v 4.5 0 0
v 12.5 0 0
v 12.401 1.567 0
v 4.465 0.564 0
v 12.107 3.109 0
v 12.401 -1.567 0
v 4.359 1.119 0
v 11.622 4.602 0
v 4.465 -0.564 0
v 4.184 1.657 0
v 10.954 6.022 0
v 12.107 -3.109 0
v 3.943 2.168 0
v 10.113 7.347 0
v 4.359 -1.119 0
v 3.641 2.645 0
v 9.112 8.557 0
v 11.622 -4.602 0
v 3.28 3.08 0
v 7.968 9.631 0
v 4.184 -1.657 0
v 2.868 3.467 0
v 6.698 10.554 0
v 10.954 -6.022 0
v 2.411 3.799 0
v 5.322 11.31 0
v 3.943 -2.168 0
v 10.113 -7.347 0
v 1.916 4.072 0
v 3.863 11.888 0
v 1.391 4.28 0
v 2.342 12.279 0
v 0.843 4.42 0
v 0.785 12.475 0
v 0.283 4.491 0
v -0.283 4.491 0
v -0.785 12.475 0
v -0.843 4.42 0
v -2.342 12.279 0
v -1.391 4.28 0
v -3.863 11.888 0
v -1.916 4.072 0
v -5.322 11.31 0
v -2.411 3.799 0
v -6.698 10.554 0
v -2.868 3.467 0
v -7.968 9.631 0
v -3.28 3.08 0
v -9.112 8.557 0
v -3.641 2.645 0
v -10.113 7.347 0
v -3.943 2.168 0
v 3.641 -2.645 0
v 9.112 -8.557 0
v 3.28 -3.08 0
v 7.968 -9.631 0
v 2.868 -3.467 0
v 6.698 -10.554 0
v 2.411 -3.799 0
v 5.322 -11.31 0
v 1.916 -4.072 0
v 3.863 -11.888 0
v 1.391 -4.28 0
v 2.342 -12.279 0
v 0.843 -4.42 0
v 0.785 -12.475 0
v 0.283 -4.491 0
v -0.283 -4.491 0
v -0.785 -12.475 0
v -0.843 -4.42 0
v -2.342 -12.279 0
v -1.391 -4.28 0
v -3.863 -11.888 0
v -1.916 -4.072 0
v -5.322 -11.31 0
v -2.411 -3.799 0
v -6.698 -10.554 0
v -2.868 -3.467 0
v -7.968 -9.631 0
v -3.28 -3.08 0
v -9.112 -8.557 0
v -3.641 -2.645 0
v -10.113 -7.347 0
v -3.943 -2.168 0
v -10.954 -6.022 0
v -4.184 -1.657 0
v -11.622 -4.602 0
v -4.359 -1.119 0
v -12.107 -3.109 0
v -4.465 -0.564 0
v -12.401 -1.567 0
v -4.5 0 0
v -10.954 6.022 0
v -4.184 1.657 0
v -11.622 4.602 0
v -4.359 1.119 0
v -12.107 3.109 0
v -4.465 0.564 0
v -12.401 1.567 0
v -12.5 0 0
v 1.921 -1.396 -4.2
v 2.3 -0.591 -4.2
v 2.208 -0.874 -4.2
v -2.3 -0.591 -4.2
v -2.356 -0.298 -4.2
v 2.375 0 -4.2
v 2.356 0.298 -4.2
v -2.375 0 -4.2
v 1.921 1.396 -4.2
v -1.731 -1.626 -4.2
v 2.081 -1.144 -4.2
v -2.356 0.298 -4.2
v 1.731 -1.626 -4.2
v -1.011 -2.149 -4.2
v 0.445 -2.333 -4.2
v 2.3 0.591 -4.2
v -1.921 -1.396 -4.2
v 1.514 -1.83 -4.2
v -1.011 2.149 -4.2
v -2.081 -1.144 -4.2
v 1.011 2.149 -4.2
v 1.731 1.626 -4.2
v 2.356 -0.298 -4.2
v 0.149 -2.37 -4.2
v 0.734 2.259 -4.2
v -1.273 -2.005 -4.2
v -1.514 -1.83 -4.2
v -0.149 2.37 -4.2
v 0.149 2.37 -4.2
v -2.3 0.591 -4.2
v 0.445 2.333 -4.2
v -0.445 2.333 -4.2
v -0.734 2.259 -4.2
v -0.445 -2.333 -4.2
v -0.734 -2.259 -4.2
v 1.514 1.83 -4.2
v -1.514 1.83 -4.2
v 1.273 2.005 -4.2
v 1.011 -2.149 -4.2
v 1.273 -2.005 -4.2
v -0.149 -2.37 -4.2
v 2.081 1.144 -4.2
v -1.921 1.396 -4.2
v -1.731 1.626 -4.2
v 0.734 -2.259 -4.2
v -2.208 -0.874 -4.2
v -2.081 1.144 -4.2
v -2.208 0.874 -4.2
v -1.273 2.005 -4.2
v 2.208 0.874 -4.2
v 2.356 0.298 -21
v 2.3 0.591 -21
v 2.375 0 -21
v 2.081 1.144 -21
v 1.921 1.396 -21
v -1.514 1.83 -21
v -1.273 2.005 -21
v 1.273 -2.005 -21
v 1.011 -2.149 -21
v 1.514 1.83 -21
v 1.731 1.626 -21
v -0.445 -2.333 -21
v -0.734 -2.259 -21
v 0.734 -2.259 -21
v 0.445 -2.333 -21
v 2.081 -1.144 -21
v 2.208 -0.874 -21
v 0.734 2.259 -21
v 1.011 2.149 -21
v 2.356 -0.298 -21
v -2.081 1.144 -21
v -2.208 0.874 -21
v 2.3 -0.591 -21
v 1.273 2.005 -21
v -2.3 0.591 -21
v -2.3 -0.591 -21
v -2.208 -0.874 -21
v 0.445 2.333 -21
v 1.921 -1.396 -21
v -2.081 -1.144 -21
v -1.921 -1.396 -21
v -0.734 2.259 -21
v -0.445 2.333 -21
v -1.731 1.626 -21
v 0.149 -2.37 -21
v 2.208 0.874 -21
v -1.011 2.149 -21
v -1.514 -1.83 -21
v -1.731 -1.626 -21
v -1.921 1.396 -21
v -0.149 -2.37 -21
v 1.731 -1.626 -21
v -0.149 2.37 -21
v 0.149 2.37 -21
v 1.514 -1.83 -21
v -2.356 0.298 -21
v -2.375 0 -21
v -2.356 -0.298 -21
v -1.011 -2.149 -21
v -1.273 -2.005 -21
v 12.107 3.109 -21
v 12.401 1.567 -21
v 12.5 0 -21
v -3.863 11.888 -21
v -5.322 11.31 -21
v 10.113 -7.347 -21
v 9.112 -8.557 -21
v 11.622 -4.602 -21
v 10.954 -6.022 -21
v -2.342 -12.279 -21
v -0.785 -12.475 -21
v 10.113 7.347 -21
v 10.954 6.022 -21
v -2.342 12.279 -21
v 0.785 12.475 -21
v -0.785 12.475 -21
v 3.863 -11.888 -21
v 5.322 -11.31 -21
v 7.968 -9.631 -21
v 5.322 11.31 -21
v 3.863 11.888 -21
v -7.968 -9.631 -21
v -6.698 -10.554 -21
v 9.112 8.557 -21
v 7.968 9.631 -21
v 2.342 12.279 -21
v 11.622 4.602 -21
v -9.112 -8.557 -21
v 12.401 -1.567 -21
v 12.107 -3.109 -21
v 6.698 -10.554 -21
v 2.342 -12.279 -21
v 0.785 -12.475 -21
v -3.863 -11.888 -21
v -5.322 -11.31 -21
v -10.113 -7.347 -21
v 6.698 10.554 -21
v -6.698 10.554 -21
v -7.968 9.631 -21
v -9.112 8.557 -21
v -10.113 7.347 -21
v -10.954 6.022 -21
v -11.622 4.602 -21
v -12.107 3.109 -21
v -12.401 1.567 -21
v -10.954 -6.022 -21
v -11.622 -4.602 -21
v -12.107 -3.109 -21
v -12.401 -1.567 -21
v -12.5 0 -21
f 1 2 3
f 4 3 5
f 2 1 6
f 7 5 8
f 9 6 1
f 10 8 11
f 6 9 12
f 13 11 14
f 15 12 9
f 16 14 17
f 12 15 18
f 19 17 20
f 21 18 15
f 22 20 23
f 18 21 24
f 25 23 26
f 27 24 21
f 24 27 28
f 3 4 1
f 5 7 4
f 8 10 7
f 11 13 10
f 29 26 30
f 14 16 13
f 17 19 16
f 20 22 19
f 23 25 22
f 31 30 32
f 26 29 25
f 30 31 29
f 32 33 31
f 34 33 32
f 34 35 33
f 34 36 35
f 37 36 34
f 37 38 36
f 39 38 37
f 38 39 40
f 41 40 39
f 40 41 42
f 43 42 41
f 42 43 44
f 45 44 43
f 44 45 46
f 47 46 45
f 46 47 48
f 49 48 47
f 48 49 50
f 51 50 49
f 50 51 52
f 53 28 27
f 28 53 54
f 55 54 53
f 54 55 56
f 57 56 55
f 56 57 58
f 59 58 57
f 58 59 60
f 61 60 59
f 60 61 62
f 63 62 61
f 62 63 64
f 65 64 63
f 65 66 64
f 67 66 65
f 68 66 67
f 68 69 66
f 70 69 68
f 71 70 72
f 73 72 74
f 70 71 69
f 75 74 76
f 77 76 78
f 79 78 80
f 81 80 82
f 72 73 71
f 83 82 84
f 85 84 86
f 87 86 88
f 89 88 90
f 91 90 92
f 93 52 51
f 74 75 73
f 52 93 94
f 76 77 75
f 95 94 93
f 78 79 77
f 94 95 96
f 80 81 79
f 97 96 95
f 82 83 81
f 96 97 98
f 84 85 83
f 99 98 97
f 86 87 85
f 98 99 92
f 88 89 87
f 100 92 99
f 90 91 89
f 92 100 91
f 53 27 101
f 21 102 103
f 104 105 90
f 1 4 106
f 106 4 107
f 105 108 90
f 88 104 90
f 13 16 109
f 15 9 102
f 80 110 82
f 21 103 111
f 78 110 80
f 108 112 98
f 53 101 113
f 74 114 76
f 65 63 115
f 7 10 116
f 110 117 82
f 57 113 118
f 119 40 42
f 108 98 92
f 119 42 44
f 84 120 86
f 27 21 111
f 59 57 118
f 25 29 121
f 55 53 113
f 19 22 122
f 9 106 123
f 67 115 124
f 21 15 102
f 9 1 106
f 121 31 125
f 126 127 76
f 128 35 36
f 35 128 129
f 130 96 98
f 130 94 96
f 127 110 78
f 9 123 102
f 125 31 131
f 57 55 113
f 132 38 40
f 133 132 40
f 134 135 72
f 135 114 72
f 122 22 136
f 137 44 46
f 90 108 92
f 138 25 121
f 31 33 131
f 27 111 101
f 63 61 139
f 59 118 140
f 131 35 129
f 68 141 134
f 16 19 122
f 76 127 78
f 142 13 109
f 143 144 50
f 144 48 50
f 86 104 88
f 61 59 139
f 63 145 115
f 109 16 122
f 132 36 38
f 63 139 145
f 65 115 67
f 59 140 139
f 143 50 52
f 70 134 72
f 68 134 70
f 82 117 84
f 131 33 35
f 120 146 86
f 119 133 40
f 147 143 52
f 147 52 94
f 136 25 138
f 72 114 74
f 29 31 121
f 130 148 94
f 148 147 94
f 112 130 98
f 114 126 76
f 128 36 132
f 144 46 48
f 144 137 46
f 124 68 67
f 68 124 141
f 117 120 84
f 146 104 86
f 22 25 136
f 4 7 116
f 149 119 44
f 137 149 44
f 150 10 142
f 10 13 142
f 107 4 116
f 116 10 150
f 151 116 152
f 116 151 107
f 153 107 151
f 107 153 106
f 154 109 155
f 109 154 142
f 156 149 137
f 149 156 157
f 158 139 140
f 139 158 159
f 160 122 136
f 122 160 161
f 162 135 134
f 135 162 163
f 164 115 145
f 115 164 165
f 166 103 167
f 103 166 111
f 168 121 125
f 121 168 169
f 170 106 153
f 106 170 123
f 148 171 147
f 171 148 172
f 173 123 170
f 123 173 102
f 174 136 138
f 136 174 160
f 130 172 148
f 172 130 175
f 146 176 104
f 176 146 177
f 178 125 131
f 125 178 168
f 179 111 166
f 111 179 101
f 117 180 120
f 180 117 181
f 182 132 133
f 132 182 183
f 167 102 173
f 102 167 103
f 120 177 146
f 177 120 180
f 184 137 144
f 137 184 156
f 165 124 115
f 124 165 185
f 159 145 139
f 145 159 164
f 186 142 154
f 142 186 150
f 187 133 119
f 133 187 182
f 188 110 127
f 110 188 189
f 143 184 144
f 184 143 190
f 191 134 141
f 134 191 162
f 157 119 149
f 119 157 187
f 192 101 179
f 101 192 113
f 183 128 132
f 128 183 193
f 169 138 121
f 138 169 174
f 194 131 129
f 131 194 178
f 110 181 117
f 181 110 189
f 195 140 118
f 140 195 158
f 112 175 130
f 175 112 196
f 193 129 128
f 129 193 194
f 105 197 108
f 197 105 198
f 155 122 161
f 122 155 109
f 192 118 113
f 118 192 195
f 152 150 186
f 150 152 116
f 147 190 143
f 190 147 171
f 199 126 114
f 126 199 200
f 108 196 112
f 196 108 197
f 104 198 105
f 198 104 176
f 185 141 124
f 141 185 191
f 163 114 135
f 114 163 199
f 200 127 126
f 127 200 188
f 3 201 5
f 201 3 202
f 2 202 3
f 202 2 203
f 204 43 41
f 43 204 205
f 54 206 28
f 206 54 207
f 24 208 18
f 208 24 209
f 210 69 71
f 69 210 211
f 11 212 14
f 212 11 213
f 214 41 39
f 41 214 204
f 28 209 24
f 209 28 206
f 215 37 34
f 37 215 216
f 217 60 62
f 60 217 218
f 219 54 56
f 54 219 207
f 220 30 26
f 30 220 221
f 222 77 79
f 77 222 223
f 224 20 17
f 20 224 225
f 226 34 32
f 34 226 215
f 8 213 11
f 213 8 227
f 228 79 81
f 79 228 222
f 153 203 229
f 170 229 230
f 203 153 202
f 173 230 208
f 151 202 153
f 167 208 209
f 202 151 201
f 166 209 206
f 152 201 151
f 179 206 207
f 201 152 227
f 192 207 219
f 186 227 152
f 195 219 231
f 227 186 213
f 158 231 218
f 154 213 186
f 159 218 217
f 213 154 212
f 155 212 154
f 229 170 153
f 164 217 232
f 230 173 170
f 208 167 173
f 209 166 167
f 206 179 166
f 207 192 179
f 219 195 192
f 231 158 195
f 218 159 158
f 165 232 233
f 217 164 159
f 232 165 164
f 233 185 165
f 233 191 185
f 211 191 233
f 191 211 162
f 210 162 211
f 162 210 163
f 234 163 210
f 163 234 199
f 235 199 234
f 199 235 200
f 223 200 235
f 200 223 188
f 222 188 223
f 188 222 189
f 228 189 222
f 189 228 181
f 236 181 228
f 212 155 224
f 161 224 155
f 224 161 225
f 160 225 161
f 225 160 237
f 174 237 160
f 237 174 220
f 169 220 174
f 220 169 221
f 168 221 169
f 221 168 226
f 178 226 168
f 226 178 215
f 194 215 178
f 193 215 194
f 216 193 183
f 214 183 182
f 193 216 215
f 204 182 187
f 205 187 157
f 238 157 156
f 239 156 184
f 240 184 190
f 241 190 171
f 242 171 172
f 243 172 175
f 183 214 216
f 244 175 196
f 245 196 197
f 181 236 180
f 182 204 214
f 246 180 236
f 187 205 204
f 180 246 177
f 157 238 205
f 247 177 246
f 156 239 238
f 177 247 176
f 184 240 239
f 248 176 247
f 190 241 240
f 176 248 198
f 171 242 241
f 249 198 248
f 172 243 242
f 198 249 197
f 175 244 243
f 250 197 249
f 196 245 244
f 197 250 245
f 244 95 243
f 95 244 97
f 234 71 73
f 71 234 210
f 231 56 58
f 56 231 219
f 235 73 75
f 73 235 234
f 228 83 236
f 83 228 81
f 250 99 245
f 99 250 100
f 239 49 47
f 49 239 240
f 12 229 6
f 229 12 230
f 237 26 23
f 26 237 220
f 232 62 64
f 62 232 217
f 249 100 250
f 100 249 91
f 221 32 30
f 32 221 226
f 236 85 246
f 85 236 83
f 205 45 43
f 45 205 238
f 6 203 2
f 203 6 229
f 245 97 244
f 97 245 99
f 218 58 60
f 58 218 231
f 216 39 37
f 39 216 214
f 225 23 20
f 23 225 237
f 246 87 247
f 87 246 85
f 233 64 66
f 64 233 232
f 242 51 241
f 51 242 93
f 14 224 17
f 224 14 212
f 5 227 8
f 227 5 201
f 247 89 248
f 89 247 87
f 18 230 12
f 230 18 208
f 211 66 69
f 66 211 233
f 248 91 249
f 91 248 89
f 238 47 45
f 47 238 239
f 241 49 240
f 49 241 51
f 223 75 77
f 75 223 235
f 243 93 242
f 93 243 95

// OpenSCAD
$fn = 50;

difference() {
	union() {
		translate(v = [0, 0, -21.0]) {
			cylinder(h = 21, r = 12.5);
		}
	}
	union() {
		translate(v = [0, 0, 0]) {
			rotate(a = [0, 0, 0]) {
				difference() {
					union() {
						translate(v = [0, 0, -24.0]) {
							cylinder(h = 24, r = 2.25);
						}
						translate(v = [0, 0, -4.2]) {
							cylinder(h = 4.2, r1 = 2.375, r2 = 4.5);
						}
						translate(v = [0, 0, -24.0]) {
							cylinder(h = 24, r = 2.375);
						}
						translate(v = [0, 0, -24.0]) {
							cylinder(h = 24, r = 2.25);
						}
					}
					union();
				}
			}
		}
	}
}
